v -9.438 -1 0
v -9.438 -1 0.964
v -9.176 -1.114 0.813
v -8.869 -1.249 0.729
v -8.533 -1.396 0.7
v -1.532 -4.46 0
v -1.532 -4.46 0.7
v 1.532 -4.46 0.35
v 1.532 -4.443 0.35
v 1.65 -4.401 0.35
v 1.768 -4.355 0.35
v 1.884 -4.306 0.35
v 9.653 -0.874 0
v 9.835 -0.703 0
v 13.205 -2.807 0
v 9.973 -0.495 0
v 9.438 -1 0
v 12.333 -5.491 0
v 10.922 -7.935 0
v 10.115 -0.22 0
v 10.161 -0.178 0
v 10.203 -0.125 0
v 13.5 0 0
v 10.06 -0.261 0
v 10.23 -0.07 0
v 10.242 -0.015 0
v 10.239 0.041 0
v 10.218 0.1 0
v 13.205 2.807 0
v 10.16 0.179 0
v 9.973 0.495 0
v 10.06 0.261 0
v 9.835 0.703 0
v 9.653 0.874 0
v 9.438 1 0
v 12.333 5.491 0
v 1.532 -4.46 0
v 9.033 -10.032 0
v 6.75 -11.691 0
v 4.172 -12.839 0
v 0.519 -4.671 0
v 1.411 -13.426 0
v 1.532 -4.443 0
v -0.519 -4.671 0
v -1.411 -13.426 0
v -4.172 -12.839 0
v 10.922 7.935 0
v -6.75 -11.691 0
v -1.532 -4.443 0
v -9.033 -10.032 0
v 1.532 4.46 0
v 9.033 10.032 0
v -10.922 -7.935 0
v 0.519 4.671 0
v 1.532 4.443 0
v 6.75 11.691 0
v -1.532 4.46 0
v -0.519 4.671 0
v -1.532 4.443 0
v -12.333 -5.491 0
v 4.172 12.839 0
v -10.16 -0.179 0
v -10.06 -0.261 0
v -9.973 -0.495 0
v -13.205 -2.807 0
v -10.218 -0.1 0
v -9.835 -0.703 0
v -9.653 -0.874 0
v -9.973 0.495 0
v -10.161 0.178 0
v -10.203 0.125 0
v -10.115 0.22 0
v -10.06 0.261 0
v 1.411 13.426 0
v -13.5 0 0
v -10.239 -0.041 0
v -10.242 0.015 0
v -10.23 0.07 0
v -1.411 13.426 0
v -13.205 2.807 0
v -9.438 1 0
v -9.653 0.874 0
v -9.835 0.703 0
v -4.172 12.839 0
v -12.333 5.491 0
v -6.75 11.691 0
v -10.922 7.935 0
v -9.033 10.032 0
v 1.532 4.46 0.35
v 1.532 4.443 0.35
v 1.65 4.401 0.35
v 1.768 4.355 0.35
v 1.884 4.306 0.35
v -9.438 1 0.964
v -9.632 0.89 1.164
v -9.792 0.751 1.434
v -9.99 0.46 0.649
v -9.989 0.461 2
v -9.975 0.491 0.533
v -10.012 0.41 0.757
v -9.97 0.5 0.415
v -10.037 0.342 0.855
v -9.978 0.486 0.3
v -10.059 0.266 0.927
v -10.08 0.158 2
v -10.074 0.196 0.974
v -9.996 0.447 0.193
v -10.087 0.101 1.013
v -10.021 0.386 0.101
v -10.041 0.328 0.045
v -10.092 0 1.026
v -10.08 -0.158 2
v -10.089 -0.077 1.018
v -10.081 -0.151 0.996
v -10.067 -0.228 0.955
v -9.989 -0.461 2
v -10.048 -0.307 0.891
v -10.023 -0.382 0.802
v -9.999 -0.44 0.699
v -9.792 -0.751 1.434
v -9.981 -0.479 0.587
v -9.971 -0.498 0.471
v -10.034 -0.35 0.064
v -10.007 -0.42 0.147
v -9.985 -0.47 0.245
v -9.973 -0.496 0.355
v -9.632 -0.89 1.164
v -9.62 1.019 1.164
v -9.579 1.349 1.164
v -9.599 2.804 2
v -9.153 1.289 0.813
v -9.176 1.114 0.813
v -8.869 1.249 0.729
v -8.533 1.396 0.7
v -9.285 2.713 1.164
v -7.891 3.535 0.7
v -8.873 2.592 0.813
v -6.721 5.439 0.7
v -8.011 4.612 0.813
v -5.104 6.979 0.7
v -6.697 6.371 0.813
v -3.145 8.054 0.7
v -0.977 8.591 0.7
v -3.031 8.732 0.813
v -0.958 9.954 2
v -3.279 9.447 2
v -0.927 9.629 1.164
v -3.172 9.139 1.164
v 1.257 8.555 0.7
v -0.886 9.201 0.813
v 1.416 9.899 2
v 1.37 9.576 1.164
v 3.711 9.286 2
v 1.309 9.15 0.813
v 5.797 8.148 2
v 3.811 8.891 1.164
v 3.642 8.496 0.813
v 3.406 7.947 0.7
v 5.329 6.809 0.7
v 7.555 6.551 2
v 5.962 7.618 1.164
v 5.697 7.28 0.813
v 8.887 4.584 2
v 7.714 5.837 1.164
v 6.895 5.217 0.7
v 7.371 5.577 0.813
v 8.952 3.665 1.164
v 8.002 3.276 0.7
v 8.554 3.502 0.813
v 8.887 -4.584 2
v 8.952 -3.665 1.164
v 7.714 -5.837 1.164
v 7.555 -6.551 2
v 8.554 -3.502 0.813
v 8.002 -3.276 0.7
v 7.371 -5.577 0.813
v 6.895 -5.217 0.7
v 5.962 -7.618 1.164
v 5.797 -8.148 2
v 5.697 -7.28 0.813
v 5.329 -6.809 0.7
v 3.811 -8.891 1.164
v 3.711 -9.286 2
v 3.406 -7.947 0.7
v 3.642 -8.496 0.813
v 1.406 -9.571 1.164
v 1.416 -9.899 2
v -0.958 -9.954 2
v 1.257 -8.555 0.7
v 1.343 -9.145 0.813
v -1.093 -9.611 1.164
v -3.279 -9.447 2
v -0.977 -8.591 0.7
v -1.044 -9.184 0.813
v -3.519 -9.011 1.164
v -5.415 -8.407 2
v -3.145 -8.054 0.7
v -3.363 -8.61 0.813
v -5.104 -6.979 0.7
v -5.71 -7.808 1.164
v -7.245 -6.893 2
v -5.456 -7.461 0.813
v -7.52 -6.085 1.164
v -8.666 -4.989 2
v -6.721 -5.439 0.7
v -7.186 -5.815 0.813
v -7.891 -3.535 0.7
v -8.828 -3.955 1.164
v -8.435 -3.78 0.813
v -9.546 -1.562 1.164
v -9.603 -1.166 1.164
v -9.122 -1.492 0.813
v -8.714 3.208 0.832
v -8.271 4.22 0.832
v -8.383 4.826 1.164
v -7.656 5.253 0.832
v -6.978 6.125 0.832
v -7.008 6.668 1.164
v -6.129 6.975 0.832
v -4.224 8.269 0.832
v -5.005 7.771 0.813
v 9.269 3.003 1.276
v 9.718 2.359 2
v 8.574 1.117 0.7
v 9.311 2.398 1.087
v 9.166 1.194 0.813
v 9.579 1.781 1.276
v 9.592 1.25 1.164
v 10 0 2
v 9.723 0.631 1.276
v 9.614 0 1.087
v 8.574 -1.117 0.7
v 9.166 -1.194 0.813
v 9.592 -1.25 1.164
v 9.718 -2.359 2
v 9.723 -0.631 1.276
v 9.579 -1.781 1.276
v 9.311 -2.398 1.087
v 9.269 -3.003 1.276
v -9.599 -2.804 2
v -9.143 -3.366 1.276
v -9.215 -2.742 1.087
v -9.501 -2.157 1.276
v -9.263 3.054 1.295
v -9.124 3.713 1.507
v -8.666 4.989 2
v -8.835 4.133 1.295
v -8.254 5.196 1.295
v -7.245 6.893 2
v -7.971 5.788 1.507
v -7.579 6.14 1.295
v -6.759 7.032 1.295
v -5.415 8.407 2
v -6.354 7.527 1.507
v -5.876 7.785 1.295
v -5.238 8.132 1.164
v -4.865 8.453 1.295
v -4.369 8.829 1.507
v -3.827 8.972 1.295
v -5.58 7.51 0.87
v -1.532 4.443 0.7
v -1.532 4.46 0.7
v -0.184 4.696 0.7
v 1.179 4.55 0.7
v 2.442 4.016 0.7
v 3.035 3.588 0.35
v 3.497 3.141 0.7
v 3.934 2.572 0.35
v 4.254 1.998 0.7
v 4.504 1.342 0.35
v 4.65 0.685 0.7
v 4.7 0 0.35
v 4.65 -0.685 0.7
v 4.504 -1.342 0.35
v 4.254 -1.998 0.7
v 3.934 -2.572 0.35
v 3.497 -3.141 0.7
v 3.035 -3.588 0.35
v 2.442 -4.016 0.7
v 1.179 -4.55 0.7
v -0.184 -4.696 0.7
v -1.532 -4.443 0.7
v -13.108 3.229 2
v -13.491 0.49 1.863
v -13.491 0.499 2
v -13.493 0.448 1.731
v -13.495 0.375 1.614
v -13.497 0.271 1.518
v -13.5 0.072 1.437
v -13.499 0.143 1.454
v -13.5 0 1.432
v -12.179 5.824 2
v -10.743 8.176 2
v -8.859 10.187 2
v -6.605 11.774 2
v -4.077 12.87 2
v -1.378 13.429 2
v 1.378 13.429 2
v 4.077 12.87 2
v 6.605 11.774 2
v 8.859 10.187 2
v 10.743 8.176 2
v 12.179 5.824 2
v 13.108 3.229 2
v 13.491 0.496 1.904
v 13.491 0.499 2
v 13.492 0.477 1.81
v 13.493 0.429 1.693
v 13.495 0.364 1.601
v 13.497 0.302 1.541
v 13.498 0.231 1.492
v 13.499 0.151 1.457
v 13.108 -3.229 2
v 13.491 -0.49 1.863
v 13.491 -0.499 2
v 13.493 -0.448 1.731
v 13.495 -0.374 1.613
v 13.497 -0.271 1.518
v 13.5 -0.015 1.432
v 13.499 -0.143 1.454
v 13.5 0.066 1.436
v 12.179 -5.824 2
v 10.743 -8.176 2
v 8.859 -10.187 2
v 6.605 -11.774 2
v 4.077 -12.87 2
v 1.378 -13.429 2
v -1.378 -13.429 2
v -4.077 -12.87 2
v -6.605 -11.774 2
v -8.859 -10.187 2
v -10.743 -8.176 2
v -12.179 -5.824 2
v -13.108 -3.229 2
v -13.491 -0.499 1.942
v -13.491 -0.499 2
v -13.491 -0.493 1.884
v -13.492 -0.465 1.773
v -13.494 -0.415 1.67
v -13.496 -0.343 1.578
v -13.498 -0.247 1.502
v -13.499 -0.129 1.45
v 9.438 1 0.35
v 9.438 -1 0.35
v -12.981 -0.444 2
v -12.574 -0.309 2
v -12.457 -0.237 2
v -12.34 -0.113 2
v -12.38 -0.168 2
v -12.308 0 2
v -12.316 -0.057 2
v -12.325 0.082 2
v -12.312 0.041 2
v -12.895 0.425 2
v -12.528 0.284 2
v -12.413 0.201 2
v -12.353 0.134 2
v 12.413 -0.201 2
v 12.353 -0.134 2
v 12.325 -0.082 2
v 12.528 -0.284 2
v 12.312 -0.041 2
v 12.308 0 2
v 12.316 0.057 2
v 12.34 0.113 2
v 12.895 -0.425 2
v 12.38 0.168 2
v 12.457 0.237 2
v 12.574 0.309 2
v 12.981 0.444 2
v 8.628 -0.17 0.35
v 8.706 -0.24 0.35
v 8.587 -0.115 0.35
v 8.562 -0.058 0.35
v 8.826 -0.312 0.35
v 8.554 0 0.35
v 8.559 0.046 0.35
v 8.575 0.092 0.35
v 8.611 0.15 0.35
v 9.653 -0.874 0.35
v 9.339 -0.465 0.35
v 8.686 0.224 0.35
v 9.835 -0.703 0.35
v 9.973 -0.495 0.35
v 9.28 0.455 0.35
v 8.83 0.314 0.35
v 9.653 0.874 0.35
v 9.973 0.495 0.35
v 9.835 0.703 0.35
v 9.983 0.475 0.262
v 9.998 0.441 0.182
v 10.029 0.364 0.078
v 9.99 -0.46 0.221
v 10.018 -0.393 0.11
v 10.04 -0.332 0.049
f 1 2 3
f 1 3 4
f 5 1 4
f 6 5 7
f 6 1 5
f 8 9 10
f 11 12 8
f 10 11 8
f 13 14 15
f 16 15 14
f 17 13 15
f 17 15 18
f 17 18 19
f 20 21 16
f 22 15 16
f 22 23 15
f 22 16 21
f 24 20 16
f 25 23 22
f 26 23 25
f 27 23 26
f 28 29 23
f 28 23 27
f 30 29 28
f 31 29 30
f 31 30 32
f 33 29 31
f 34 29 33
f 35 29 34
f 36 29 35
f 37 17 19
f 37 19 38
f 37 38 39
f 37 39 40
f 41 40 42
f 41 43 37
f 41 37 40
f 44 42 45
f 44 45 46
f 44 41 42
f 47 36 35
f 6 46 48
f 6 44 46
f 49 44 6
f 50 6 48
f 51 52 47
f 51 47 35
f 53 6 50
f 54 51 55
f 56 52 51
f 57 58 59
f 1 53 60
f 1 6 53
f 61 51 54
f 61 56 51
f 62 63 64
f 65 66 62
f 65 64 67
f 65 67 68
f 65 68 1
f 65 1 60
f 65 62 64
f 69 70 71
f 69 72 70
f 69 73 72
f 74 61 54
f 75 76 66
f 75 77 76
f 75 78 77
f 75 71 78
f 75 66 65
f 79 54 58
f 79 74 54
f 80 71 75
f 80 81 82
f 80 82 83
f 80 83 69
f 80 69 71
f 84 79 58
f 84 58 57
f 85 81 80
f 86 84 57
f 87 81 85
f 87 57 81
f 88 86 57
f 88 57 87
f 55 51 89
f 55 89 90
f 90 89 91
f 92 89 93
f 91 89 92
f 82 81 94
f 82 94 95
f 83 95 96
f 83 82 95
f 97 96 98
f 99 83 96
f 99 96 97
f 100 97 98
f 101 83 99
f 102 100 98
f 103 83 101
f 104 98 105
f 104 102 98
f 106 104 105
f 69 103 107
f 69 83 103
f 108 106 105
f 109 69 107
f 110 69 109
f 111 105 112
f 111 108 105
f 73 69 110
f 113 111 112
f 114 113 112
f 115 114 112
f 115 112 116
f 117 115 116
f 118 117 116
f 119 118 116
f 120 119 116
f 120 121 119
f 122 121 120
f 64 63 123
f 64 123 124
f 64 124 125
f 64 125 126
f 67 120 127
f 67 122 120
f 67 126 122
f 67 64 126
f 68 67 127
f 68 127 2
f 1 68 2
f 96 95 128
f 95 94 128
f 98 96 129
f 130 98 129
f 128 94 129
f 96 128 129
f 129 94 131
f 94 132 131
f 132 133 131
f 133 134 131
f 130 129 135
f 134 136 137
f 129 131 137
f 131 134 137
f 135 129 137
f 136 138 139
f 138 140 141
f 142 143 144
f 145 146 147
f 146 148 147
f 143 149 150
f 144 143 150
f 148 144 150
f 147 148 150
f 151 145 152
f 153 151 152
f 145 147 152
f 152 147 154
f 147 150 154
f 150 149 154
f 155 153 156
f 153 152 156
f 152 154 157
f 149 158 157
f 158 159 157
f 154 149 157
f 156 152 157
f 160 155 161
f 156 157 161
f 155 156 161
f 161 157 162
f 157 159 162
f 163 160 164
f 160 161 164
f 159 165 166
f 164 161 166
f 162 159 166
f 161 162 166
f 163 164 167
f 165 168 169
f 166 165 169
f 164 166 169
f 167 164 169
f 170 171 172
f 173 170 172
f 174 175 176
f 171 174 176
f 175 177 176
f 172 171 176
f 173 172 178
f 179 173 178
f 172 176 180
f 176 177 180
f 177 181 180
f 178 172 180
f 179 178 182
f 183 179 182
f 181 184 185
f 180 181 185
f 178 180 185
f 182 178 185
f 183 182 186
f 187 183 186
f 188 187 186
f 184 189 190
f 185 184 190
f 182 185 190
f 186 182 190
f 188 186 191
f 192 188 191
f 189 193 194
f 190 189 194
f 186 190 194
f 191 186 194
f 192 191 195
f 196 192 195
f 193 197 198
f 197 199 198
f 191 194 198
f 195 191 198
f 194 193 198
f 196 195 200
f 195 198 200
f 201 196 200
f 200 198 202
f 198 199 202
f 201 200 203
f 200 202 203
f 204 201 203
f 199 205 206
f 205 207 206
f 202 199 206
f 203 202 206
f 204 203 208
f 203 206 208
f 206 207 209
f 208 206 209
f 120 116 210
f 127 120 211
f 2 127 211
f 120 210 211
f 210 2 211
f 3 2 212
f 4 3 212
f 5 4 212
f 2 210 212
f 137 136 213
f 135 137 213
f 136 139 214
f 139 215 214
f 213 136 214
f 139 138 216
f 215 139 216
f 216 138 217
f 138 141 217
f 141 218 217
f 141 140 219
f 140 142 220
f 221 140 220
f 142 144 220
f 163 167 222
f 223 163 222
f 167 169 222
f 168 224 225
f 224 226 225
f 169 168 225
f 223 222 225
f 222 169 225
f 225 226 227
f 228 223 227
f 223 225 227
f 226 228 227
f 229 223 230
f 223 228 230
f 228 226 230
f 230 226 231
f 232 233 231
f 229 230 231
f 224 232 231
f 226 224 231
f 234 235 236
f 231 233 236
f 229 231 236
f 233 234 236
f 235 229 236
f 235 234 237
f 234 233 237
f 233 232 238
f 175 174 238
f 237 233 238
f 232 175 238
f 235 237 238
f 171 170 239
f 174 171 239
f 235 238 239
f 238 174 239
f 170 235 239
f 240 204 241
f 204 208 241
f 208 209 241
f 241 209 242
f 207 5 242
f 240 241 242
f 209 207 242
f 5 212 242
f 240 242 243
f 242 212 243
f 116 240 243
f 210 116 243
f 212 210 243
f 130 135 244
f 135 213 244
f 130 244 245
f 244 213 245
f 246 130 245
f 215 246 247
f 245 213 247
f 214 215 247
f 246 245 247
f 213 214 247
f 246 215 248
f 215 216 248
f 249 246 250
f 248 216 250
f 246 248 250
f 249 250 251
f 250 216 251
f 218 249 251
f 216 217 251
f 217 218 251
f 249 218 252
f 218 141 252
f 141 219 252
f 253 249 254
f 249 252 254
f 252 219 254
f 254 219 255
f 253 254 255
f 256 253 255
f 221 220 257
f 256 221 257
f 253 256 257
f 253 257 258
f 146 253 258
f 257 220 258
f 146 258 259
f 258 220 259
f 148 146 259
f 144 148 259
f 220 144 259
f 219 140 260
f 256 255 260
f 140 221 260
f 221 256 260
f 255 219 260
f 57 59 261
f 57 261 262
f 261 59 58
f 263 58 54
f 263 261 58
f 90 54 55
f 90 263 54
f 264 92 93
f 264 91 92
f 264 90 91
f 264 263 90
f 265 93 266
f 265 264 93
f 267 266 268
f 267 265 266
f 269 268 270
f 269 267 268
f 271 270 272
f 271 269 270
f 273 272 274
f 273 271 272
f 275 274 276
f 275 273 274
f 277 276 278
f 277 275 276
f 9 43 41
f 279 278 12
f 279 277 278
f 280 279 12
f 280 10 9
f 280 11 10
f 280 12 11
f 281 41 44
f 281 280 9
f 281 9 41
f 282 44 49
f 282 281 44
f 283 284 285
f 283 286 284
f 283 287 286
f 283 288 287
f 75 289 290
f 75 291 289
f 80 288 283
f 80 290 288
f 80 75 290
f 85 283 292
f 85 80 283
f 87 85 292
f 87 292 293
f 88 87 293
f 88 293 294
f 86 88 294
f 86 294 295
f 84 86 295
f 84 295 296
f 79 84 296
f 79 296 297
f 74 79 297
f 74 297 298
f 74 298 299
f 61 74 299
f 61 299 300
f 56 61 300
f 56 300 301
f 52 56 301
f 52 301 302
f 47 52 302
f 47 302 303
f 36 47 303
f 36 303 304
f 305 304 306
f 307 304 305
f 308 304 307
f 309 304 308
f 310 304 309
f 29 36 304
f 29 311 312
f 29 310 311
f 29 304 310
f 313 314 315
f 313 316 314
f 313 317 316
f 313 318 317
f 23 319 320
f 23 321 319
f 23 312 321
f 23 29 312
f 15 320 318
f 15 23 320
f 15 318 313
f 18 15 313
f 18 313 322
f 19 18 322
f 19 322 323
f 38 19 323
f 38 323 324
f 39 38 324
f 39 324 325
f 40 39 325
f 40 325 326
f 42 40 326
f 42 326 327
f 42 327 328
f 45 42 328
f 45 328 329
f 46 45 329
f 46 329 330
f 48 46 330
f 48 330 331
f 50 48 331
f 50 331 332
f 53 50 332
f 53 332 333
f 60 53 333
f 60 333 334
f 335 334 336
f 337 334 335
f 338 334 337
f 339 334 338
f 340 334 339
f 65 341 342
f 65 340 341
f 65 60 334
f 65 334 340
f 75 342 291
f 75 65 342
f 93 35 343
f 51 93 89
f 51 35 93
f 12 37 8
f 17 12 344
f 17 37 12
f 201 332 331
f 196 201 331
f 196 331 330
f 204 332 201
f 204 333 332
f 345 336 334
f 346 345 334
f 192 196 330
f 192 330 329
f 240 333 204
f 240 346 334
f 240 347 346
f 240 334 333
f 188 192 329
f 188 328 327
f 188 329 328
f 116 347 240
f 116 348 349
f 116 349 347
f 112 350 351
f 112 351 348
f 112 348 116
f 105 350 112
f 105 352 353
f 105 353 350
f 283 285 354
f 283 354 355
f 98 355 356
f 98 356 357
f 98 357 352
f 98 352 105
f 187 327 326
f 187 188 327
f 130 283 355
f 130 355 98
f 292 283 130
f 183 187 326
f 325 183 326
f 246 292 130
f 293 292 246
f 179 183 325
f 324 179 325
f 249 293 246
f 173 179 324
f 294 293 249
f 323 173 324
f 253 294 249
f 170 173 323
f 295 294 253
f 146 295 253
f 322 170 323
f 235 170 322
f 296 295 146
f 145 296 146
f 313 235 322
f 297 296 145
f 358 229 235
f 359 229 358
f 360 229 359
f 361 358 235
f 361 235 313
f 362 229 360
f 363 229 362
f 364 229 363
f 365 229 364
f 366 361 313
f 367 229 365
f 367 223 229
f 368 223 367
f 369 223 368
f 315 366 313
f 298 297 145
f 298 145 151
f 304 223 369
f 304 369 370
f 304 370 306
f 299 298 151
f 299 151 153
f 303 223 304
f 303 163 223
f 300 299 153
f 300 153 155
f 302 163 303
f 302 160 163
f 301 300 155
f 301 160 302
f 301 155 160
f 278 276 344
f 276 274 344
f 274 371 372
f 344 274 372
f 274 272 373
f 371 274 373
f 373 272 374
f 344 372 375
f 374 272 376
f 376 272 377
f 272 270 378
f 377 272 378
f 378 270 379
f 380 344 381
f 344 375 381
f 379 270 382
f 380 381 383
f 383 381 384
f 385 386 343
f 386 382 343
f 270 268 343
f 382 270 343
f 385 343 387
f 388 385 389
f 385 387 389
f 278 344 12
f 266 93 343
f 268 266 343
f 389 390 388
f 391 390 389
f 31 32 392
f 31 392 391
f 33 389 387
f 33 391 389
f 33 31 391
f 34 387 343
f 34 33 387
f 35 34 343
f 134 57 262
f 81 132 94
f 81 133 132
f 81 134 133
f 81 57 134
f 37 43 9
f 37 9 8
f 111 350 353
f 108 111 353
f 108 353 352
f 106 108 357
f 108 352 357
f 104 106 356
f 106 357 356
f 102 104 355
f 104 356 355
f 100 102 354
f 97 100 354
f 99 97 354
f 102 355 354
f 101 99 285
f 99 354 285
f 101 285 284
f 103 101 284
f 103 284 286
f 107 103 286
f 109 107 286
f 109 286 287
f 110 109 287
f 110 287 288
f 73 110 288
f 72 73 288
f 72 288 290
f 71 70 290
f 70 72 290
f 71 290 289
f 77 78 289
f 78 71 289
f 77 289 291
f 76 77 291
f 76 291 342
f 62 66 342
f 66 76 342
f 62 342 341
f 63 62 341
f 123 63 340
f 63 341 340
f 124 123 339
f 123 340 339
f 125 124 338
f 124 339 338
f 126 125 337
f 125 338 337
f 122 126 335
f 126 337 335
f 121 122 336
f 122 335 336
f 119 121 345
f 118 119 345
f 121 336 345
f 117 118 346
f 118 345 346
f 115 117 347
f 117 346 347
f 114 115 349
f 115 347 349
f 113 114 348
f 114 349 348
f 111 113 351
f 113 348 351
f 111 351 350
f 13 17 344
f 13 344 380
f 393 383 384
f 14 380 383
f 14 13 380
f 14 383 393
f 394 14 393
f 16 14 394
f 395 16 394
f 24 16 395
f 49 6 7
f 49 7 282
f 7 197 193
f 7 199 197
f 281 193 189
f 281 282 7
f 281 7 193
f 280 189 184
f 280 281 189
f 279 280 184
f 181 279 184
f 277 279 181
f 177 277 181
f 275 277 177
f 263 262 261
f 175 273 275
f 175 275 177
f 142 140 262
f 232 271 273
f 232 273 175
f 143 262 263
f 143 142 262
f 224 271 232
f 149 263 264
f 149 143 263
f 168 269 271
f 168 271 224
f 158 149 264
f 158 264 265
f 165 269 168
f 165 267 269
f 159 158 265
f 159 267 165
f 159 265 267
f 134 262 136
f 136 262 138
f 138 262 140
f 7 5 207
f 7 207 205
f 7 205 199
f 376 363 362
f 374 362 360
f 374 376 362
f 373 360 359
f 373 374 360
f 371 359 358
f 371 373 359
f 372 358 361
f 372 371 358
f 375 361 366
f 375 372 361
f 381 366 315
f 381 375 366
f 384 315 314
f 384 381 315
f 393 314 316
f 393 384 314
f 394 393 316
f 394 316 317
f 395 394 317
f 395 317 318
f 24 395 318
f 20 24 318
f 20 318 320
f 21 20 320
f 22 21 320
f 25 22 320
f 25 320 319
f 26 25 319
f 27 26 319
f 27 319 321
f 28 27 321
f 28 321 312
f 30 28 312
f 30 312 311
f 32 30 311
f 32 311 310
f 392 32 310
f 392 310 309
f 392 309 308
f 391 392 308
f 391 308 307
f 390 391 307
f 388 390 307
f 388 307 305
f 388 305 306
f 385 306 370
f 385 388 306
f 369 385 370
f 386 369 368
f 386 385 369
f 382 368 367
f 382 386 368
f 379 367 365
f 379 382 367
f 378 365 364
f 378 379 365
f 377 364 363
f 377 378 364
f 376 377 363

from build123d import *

# Parameters (mm, degrees)
F3_DEPTH = 0.35
F4_DEPTH = 5


with BuildPart() as f1:
    # F0 (on Front) → F1 (revolve)
    with BuildSketch(Plane.XZ):
        with BuildLine():
            add(Edge.make_bspline(
                [(-10, 2), (-9.8134251311, 1.2643112568), (-9.5979757607, 0.7219304822), (-8.6464062333, 0.7)],
                knots=[0, 0, 0, 0, 1.8767567997, 1.8767567997, 1.8767567997, 1.8767567997], degree=3))
            Line((-10, 2), (-13.5, 2))
            Line((-13.5, 2), (-13.5, 0))
            Line((-13.5, 0), (-4.7, 0))
            Line((-4.7, 0), (-4.7, 0.7))
            Line((-4.7, 0.7), (-8.6464062333, 0.7))
        make_face()
    revolve(axis=Axis((0, 0, 0.3460962325), (0, 0, -1)))

    # F2 (on Top) → F3 (cut)
    with BuildSketch(Plane.XY):
        with BuildLine():
            Line((9.4376522897, 1), (1.5316589494, 4.4600760879))
            Line((1.5316589494, 4.4600760879), (1.5316589494, -4.4600760879))
            Line((1.5316589494, -4.4600760879), (9.4376522897, -1))
            ThreePointArc((9.4376522897, -1), (10.0915766243, 0), (9.4376522897, 1))
        make_face()
    extrude(amount=F3_DEPTH, mode=Mode.SUBTRACT)

    # F2 (on Top) → F4 (cut)
    with BuildSketch(Plane.XY):
        with BuildLine():
            Line((-1.5316589494, -4.4600760879), (-1.5316589494, 4.4600760879))
            Line((-1.5316589494, 4.4600760879), (-9.4376522897, 1))
            ThreePointArc((-9.4376522897, 1), (-10.0915766243, 0), (-9.4376522897, -1))
            Line((-9.4376522897, -1), (-1.5316589494, -4.4600760879))
        make_face()
    extrude(amount=F4_DEPTH, mode=Mode.SUBTRACT)

    # F5 (on Front) → F6 (revolve, cut)
    with BuildSketch(Plane.XZ):
        Polygon((7.8459653944, 0.038968916), (9, 0), (13.550709933, 2), (13.3823033062, 2.4721443956), align=None)
    revolve(axis=Axis((11.2753549665, 0, 1), (0.9154864336, 0, 0.402348841)), mode=Mode.SUBTRACT)

    # F5 (on Front) → F7 (revolve, cut)
    with BuildSketch(Plane.XZ):
        Polygon((-13.3823033062, 2.4721443956), (-13.550709933, 2), (-9, 0), (-7.8459653944, 0.038968916), align=None)
    revolve(axis=Axis((-11.2753549665, 0, 1), (-0.9154864336, 0, 0.402348841)), mode=Mode.SUBTRACT)


solid = f1.part
